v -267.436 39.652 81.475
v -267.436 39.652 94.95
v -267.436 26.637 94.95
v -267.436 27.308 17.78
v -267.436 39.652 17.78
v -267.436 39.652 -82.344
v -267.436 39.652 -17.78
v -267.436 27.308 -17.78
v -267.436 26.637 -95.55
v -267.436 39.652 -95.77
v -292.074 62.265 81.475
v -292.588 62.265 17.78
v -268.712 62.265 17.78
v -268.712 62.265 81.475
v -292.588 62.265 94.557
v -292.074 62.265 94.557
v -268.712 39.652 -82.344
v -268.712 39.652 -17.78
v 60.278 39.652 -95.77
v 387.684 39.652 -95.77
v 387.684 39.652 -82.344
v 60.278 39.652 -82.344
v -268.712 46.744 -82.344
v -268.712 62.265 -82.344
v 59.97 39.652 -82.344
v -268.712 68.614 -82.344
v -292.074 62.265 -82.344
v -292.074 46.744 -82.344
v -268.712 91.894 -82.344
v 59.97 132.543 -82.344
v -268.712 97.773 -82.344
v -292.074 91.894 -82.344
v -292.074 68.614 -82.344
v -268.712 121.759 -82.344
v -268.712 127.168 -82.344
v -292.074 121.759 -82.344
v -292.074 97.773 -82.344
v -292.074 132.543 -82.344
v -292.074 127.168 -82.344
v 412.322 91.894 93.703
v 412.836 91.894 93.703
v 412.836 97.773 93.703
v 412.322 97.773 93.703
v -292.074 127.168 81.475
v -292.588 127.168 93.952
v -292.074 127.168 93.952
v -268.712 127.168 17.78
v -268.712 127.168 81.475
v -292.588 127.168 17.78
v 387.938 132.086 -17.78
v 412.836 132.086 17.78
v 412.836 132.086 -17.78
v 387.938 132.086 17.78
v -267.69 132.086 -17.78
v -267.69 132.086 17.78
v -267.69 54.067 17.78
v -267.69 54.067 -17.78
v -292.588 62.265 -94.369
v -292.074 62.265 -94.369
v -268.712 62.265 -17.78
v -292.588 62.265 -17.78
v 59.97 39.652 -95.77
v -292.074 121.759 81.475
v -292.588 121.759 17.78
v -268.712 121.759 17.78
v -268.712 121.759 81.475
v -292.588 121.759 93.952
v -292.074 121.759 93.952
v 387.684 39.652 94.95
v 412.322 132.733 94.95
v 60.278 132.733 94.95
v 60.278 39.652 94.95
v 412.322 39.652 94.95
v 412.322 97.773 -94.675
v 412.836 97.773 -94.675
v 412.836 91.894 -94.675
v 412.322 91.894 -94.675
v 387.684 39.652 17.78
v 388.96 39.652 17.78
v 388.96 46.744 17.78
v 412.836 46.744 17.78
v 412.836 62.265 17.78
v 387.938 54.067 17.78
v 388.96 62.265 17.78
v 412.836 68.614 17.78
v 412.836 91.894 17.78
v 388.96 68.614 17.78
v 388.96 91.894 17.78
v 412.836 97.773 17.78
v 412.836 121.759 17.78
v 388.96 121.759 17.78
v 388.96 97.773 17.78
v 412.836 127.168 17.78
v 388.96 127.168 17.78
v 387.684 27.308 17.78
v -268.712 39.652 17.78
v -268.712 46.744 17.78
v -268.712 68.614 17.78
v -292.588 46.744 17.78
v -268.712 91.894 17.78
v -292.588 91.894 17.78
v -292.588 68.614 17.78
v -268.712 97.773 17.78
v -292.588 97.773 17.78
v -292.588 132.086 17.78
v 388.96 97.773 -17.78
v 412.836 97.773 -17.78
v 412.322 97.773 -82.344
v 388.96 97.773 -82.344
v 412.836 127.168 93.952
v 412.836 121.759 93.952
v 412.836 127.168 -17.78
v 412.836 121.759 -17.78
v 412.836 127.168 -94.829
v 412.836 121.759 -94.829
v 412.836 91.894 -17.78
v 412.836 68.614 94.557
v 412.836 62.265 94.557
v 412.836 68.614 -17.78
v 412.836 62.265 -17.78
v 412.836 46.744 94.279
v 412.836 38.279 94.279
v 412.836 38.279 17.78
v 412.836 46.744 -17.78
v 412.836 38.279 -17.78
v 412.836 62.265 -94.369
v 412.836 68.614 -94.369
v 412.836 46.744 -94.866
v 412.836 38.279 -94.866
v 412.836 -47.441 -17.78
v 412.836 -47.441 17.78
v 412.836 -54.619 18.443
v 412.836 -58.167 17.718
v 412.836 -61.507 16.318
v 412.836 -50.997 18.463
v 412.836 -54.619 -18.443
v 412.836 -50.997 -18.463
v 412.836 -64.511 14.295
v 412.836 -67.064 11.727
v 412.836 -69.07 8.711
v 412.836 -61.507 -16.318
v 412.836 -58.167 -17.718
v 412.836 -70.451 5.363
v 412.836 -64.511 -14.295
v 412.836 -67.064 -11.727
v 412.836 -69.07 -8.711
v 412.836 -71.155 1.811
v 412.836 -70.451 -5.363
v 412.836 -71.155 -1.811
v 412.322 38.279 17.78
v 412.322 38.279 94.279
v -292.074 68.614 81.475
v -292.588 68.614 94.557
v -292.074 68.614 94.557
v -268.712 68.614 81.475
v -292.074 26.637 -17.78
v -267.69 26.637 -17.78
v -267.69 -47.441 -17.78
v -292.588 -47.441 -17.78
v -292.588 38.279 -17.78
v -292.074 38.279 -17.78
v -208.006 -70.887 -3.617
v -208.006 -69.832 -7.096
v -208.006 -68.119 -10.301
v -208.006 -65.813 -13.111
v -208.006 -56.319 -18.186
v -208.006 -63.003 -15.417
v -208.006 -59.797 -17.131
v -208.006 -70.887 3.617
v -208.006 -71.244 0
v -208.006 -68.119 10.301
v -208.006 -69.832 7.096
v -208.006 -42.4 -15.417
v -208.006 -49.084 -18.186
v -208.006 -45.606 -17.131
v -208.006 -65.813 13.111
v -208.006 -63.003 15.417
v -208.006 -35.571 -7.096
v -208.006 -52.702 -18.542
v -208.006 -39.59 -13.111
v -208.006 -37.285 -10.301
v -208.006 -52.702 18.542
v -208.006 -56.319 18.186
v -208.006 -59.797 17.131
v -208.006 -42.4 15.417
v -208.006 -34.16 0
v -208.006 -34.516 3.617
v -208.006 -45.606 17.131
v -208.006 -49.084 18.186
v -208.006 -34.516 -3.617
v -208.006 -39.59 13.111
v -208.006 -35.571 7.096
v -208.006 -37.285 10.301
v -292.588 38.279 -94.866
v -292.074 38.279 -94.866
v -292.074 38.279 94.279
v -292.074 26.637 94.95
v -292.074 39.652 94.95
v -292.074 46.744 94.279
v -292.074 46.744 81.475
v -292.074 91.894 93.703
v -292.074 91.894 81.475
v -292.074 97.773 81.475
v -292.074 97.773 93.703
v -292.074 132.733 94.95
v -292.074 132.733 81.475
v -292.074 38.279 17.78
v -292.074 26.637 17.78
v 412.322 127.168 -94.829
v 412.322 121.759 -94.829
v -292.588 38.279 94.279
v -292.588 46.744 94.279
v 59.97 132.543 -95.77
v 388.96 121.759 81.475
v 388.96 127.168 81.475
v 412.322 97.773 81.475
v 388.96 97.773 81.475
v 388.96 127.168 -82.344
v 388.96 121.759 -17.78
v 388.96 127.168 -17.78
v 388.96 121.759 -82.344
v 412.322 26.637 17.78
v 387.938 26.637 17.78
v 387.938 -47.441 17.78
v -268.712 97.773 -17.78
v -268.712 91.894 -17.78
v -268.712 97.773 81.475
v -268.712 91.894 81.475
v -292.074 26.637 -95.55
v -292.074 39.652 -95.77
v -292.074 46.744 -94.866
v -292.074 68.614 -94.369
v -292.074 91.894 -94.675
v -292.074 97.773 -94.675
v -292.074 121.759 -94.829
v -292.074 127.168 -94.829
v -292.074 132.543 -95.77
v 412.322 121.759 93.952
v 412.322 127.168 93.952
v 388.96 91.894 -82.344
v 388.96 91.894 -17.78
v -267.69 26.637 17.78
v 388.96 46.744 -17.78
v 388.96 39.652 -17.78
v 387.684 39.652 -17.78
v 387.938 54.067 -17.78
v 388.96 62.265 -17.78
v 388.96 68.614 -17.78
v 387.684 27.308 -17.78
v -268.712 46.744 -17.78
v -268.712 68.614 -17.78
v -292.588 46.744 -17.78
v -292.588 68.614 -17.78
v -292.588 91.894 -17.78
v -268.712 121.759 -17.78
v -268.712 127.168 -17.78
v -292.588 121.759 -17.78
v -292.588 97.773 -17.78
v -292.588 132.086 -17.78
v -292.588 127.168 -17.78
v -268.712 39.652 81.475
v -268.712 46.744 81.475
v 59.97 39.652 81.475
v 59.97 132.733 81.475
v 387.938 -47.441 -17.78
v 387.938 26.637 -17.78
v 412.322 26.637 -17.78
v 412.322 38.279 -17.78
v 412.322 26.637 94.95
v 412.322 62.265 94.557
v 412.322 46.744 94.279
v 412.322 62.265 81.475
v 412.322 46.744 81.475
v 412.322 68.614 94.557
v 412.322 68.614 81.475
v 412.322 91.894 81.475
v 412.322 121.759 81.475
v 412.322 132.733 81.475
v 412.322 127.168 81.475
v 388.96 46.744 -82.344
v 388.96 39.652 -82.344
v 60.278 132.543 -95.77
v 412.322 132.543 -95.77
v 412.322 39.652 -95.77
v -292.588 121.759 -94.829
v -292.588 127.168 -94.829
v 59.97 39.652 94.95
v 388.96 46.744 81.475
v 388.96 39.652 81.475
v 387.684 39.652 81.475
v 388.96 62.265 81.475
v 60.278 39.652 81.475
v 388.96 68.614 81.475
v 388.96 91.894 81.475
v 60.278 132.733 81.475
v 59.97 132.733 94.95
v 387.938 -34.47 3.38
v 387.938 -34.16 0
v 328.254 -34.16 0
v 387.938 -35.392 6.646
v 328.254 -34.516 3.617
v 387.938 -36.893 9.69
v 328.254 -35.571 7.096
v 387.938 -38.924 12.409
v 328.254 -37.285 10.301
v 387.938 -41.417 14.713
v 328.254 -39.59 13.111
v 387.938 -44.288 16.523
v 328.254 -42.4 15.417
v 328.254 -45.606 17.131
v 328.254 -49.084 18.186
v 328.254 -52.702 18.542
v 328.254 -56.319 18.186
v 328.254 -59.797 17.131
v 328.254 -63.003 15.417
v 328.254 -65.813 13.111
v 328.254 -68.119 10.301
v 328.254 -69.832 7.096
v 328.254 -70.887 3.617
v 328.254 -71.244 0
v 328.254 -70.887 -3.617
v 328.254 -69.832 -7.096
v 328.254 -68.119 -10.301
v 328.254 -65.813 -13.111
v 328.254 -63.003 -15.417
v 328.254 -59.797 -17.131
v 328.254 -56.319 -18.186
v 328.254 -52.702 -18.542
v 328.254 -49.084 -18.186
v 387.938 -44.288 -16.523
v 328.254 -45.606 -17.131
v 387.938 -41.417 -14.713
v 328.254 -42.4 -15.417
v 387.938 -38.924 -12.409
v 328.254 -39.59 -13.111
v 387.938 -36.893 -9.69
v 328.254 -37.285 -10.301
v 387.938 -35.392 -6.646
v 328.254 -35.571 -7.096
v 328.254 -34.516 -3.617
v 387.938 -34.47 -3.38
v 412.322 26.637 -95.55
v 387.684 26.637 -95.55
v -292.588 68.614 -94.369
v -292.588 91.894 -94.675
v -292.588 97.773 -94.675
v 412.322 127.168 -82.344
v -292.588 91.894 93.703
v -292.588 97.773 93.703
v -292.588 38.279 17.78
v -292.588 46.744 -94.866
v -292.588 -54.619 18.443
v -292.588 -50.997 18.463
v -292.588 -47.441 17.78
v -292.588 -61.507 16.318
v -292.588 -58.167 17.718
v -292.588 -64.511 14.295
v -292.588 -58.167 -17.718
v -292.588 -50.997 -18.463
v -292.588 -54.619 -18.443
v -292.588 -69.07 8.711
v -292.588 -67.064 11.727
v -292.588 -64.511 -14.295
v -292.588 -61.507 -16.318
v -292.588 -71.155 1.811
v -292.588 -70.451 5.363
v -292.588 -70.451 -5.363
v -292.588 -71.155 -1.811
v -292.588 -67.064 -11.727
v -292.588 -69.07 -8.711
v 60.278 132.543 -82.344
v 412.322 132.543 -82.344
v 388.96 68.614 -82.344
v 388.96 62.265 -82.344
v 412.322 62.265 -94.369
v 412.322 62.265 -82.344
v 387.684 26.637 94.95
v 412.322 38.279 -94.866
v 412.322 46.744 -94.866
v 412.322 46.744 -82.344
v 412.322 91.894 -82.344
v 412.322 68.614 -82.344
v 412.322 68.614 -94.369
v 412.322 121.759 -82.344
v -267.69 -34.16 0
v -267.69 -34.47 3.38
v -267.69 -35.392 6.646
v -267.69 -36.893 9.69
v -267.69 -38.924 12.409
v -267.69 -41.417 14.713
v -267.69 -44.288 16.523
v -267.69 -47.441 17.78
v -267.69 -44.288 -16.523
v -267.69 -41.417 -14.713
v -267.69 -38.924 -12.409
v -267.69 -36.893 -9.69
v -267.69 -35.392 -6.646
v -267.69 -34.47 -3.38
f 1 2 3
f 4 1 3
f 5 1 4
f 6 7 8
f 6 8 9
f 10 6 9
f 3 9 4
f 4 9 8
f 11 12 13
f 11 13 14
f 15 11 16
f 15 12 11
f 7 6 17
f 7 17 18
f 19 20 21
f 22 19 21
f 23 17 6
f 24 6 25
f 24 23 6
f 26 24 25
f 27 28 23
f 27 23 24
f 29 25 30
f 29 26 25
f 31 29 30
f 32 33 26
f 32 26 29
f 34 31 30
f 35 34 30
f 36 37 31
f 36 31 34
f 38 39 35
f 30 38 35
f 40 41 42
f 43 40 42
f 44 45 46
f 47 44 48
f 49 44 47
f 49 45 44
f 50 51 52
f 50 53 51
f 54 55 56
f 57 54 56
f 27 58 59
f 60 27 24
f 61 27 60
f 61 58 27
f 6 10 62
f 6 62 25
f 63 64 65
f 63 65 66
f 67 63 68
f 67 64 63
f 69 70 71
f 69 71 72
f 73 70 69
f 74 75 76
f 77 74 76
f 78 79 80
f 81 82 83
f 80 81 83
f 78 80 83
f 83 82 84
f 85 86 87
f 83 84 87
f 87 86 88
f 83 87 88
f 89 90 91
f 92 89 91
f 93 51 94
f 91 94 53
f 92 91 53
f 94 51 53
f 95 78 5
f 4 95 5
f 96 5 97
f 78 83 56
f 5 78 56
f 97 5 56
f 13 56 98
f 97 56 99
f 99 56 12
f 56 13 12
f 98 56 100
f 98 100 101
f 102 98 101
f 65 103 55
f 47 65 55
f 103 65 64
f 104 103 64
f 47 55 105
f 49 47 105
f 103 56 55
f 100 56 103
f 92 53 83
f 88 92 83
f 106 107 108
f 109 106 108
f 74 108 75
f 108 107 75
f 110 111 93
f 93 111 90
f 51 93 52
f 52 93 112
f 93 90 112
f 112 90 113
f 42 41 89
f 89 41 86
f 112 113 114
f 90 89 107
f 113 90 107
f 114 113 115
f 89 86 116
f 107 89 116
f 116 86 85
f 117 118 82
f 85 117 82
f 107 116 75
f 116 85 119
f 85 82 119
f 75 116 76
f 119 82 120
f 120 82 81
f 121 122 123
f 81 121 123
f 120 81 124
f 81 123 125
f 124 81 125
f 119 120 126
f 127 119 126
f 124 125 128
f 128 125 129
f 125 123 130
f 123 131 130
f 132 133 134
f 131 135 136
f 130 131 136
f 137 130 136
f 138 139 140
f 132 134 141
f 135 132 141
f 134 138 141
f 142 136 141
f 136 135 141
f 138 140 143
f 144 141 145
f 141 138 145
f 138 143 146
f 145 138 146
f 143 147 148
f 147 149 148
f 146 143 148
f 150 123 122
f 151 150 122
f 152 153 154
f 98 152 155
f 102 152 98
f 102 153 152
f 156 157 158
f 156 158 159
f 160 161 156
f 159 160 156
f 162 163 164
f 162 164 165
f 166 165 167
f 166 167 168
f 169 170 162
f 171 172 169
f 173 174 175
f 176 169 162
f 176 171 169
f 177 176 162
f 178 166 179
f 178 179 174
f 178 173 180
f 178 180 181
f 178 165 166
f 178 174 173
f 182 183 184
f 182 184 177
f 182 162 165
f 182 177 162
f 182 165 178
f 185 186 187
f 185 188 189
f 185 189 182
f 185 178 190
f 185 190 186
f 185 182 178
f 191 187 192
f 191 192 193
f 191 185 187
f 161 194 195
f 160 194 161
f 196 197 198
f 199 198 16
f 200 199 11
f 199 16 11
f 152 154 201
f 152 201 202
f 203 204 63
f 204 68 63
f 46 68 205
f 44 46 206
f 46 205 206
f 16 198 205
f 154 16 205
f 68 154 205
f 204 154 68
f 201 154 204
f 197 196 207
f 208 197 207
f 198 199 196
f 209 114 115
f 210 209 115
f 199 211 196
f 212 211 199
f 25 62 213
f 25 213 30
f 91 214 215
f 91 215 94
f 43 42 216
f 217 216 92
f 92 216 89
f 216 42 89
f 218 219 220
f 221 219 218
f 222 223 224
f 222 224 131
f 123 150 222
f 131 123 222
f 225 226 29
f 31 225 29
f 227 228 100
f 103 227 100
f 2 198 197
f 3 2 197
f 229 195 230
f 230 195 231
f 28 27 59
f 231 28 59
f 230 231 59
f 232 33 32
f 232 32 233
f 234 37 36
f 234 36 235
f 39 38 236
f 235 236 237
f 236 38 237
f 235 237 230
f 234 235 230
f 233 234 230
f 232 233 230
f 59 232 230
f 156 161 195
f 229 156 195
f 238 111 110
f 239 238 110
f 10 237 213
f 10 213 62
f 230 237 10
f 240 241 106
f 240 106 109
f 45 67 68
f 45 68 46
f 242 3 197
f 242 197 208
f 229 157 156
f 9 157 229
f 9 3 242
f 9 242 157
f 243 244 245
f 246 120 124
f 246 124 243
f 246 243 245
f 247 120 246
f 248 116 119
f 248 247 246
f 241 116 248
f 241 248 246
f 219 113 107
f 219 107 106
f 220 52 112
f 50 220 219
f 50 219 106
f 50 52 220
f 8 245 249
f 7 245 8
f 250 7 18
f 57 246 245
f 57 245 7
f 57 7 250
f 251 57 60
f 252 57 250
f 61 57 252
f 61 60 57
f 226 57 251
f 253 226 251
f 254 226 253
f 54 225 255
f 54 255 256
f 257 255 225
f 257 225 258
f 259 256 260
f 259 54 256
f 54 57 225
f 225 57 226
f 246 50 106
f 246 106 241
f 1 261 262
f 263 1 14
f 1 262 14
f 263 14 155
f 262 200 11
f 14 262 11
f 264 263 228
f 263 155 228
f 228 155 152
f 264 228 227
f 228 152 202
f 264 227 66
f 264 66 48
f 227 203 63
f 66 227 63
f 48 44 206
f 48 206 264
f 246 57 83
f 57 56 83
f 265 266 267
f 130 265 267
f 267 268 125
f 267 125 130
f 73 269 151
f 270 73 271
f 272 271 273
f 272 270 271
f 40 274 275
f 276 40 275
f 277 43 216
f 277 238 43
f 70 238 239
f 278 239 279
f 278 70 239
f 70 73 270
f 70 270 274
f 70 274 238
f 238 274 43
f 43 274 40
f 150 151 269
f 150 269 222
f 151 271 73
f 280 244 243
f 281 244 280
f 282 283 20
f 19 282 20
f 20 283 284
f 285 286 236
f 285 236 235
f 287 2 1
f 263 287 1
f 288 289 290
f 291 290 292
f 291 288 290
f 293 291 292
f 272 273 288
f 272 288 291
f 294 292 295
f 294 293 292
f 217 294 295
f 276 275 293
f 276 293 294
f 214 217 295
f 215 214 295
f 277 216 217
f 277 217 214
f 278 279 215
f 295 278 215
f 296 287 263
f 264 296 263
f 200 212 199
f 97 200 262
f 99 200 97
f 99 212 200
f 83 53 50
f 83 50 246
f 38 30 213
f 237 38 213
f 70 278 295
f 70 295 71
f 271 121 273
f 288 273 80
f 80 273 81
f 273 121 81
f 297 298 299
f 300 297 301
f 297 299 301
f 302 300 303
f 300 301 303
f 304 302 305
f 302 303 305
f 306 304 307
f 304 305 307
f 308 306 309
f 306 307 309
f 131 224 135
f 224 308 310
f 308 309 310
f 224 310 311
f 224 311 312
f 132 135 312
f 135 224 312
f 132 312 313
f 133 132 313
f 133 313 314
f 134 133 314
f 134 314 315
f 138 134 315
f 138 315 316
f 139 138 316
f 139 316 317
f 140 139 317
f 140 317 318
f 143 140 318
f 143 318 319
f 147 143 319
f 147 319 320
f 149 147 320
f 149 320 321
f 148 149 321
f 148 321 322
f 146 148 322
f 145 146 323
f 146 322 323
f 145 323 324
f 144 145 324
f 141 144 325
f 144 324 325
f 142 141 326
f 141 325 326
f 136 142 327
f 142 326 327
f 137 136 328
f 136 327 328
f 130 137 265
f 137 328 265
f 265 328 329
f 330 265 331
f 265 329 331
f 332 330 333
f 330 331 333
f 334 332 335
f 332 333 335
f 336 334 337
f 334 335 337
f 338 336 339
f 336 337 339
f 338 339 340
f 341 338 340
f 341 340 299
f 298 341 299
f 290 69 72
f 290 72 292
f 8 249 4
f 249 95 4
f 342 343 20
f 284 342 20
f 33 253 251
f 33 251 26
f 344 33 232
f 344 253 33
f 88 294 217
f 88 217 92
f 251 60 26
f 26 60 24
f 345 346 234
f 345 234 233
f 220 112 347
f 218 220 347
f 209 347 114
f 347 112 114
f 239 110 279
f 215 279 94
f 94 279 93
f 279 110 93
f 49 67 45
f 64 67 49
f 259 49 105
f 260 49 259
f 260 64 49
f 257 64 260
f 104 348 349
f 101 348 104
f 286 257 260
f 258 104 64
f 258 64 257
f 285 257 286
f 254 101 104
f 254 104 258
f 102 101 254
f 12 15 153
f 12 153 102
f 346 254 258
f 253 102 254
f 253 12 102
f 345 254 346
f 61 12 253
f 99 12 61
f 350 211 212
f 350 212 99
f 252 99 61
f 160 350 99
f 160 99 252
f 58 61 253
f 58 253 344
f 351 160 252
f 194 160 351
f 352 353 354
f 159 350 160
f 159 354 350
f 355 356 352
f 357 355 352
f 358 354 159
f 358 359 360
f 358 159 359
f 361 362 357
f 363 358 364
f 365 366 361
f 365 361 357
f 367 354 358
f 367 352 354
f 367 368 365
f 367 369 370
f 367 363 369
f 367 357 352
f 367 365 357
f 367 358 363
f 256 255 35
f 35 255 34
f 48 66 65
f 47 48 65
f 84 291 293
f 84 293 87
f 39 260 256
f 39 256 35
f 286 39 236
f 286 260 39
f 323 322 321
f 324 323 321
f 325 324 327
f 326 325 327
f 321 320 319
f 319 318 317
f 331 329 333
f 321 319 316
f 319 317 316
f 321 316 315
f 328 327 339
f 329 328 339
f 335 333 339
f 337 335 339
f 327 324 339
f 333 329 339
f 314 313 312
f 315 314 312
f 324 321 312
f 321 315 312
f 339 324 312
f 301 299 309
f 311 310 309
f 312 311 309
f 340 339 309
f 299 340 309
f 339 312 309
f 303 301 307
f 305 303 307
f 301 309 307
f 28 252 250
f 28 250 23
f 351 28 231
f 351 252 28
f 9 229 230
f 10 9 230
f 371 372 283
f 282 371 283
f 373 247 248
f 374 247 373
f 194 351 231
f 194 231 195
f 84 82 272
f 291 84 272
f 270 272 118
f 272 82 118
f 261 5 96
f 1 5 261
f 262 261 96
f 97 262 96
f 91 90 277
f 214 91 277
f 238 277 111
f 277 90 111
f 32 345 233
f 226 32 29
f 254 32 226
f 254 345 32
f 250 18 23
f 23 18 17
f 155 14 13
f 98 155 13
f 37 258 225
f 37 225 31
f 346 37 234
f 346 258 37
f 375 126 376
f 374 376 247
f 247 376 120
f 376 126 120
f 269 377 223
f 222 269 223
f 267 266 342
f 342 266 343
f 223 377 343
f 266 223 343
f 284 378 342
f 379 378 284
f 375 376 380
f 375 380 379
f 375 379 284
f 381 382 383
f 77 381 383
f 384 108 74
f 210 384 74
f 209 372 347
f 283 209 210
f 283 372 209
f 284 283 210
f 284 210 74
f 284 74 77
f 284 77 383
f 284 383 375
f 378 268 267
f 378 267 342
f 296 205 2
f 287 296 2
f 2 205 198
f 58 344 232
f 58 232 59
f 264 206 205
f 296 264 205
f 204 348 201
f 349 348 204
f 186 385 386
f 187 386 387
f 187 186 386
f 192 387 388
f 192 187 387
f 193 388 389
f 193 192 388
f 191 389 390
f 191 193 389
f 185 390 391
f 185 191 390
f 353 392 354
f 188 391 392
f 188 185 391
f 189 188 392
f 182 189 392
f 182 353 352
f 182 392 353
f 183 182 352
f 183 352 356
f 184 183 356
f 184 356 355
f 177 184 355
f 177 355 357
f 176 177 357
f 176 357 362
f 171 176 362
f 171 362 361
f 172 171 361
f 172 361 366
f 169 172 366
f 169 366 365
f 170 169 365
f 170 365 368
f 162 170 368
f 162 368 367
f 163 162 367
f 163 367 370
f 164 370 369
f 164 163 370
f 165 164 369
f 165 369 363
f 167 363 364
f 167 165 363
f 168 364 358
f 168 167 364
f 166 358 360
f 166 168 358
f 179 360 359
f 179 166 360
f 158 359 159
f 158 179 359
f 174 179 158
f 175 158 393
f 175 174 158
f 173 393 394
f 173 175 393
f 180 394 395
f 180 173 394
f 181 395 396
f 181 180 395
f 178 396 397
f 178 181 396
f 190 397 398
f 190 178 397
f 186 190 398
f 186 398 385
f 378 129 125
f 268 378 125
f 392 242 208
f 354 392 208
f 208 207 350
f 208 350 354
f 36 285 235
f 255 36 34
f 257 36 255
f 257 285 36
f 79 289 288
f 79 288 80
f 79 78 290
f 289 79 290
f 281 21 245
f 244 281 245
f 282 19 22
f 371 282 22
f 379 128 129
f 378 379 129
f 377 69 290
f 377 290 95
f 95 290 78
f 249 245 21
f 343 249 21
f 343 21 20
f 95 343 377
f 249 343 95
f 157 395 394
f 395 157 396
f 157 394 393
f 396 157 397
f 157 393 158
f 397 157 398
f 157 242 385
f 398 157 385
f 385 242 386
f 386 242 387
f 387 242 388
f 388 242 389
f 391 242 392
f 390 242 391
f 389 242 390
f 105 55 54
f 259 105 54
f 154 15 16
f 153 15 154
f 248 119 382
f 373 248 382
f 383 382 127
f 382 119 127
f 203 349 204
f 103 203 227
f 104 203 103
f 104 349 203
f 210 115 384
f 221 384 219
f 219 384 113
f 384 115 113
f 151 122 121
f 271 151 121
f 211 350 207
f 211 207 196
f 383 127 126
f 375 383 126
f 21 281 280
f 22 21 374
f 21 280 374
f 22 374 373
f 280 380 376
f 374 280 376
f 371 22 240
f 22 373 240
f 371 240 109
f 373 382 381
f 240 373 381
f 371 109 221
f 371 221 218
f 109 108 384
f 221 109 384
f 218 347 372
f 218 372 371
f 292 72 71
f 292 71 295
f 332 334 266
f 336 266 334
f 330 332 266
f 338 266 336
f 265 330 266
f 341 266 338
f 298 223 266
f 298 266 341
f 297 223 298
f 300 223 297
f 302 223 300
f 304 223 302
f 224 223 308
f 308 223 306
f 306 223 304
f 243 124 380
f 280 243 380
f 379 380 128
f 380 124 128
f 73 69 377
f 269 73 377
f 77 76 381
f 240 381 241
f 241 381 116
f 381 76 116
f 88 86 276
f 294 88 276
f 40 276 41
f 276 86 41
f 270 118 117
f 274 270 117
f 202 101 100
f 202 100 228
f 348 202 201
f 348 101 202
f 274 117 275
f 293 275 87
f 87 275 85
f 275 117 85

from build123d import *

# Parameters (mm, degrees)
BOSS_EXTRUDE1_DEPTH     = 17.78
BOSS_EXTRUDE2_START     = -0.254
BOSS_EXTRUDE2_DEPTH     = 24.638
BOSS_EXTRUDE3_START     = 328.253907246
BOSS_EXTRUDE3_OUTLINE_R = 18.542
BOSS_EXTRUDE3_DEPTH     = 84.582
CUT_EXTRUDE1_DEPTH      = 528.32
BOSS_EXTRUDE4_DEPTH     = 352.044
BOSS_EXTRUDE5_DEPTH     = 23.876


# Read off the part's stored shape, not the designer's step: Boss-Extrude3
with BuildPart() as part:
    # Sketch2 → Boss-Extrude1 (new, symmetric)
    with BuildSketch(Plane.XY):
        Polygon((60.124054664, 27.308389094), (387.937750572, 27.308389094), (387.937750572, -52.701610906), (412.835907246, -52.701610906), (412.835907246, 175.898389094), (387.937750572, 175.898389094), (387.937750572, 54.067255535), (60.124054664, 54.067255535), align=None)
    boss_extrude1 = extrude(amount=BOSS_EXTRUDE1_DEPTH, both=True)

    # 3DSketch1 → Boss-Extrude2 (add)
    with BuildSketch(Plane(origin=(387.937750572, 26.636606535, -0.300092304), x_dir=(1.1522480113550012e-15, 0.13508458090011558, -0.9908340708731408), z_dir=(1, 0, 0)).offset(BOSS_EXTRUDE2_START)):
        Polygon((0, 0), (94.376945251, -12.866806331), (96.35278288, 0), (-92.6187147, 25.763279951), (-94.376945251, 12.866806331), align=None)
    boss_extrude2 = extrude(amount=BOSS_EXTRUDE2_DEPTH)

    # Boss-Extrude3 outline → Boss-Extrude3 (add)
    with BuildSketch(Plane.YZ.offset(BOSS_EXTRUDE3_START)):
        with Locations((-52.701610906, 0)):
            Circle(BOSS_EXTRUDE3_OUTLINE_R)
    boss_extrude3 = extrude(amount=BOSS_EXTRUDE3_DEPTH)

    # 3DSketch4 → Cut-Extrude1 (cut)
    with BuildSketch(Plane(origin=(0, 190.54505023, 39.190913927), x_dir=(0, -0.6094247818041636, -0.7928438908908536), z_dir=(1, 0, 0))):
        Polygon((0, 0), (35.626268271, -46.348737362), (95.924625616, 0), (60.298357345, 46.348737362), align=None)
    cut_extrude1 = extrude(amount=CUT_EXTRUDE1_DEPTH, mode=Mode.SUBTRACT)

    # 3DSketch5 → Boss-Extrude4 (add)
    with BuildSketch(Plane(origin=(412.321750572, 39.652381829, 94.949907696), x_dir=(-2.6167454914043564e-15, 0.43787667160404403, -0.8990350496309719), z_dir=(1, 0, 0))):
        Polygon((0, 0), (12.114414059, -5.90034761), (52.872430981, 77.782771729), (40.758016921, 83.683119339), align=None)
        Polygon((171.463623123, -83.51167246), (159.39348064, -77.632887402), (200.067994044, 5.878785058), (212.138136527, 0), align=None)
    boss_extrude4 = extrude(amount=-BOSS_EXTRUDE4_DEPTH)

    # 3DSketch7 → Boss-Extrude5 (add)
    with BuildSketch(Plane(origin=(412.835907246, 127.168007467, 93.951567648), x_dir=(0, -0.42593081119403703, -0.9047557372438098), z_dir=(-1, 0, 0))):
        Polygon((0, 0), (170.799989129, -80.407313186), (173.103686862, -75.513833574), (2.303697733, 4.893479612), align=None)
        Polygon((12.745412392, 26.488926133), (183.181513062, -53.747079705), (185.685532337, -48.428080127), (15.249431667, 31.807925711), align=None)
        Polygon((24.392670249, 53.234916651), (195.324303783, -27.234370619), (198.0286446, -21.489851074), (27.097011066, 58.979436196), align=None)
        Polygon((33.959043019, 72.903233879), (205.08887574, -7.659359393), (208.694663496, 0), (37.564830775, 80.562593273), align=None)
    boss_extrude5 = extrude(amount=BOSS_EXTRUDE5_DEPTH)

    # Mirror5: Boss-Extrude1, Boss-Extrude2, Boss-Extrude3, Cut-Extrude1, Boss-Extrude4, Boss-Extrude5 across plane
    add(boss_extrude1.mirror(Plane.ZY.offset(-60.124054664)))
    add(boss_extrude2.mirror(Plane.ZY.offset(-60.124054664)))
    add(boss_extrude3.mirror(Plane.ZY.offset(-60.124054664)))
    add(cut_extrude1.mirror(Plane.ZY.offset(-60.124054664)), mode=Mode.SUBTRACT)
    add(boss_extrude4.mirror(Plane.ZY.offset(-60.124054664)))
    add(boss_extrude5.mirror(Plane.ZY.offset(-60.124054664)))


solid = part.part
